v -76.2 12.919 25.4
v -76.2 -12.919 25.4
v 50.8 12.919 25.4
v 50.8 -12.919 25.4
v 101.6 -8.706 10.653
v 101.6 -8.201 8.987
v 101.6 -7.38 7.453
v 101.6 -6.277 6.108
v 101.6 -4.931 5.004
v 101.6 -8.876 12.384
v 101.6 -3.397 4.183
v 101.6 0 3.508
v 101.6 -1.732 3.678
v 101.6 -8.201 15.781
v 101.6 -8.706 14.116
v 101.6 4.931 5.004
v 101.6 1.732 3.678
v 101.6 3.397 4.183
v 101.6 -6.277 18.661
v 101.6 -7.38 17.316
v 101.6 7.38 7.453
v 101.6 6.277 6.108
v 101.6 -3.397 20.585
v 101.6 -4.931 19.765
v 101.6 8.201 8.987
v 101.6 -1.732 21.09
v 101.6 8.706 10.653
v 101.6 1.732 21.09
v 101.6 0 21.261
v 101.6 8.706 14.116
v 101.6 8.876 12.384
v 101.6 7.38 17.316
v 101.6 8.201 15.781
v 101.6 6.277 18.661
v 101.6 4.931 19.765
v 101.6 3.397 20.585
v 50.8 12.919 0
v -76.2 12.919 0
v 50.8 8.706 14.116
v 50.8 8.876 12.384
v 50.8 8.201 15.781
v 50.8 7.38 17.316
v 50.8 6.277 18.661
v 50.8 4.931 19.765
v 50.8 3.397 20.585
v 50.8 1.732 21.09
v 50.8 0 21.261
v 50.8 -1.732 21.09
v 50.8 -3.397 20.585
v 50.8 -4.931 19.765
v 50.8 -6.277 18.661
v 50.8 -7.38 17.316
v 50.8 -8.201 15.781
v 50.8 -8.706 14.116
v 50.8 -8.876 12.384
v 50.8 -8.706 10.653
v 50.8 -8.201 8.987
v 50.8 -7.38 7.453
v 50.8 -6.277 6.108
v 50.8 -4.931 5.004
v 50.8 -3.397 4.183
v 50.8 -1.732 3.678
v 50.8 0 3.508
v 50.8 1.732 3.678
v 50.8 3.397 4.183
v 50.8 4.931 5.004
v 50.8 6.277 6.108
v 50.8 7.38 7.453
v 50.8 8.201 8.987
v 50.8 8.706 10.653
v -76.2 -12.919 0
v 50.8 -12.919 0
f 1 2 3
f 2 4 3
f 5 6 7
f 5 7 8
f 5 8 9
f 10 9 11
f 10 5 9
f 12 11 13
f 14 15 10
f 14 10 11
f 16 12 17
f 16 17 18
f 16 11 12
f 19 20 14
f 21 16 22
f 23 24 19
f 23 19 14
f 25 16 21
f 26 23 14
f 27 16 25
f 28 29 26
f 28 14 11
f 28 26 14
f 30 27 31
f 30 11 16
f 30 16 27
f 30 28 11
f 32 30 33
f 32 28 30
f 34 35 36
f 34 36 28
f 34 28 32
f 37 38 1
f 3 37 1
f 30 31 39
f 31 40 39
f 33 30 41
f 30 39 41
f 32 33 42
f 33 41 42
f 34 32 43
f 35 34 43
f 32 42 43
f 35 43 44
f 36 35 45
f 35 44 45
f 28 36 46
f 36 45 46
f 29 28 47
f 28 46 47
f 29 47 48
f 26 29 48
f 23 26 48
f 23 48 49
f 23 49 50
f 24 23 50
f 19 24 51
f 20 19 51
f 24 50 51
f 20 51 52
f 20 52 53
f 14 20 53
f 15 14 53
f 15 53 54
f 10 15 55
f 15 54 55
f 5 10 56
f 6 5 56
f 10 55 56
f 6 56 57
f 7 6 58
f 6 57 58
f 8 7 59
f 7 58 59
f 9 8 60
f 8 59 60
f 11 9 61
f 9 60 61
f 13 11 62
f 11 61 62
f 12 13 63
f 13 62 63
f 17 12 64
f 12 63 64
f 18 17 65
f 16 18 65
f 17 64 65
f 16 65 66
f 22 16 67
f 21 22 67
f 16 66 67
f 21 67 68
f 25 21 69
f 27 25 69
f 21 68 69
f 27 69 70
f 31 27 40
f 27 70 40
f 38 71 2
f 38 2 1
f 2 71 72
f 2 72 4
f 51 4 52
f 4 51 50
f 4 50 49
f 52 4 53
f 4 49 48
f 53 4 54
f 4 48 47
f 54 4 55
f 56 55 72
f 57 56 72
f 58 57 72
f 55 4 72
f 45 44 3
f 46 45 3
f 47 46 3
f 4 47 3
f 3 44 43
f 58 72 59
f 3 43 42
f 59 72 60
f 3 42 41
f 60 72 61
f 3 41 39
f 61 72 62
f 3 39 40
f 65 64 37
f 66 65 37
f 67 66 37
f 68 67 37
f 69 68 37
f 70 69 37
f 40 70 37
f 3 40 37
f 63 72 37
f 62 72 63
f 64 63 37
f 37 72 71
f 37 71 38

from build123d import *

# Parameters (mm, degrees)
F0_W     = 101.6
F0_H     = 25.8370920686
F1_DEPTH = 25.4
F3_DEPTH = 25.4
F2_R     = 8.8764145502
F4_DEPTH = 25.4
F5_DEPTH = 25.4


with BuildPart() as f1:
    # F0 (on Top) → F1 (new body)
    with BuildSketch(Plane.XY):
        Rectangle(F0_W, F0_H)
    extrude(amount=F1_DEPTH)

    # F3 (add): a face of the model
    f3_faces = [f1.faces().sort_by_distance(p)[0] for p in [
        (-50.8, 0, 12.7),
    ]]
    extrude(f3_faces, amount=F3_DEPTH)

    # F2 (on face) → F4 (join)
    with BuildSketch(Plane.YZ.offset(50.8)):
        with Locations((0, 12.3842312023)):
            Circle(F2_R)
    extrude(amount=F4_DEPTH)

    # F5 (add): a face of the model
    f5_faces = [f1.faces().sort_by_distance(p)[0] for p in [
        (76.2, 0, 12.3842312023),
    ]]
    extrude(f5_faces, amount=F5_DEPTH)


solid = f1.part
